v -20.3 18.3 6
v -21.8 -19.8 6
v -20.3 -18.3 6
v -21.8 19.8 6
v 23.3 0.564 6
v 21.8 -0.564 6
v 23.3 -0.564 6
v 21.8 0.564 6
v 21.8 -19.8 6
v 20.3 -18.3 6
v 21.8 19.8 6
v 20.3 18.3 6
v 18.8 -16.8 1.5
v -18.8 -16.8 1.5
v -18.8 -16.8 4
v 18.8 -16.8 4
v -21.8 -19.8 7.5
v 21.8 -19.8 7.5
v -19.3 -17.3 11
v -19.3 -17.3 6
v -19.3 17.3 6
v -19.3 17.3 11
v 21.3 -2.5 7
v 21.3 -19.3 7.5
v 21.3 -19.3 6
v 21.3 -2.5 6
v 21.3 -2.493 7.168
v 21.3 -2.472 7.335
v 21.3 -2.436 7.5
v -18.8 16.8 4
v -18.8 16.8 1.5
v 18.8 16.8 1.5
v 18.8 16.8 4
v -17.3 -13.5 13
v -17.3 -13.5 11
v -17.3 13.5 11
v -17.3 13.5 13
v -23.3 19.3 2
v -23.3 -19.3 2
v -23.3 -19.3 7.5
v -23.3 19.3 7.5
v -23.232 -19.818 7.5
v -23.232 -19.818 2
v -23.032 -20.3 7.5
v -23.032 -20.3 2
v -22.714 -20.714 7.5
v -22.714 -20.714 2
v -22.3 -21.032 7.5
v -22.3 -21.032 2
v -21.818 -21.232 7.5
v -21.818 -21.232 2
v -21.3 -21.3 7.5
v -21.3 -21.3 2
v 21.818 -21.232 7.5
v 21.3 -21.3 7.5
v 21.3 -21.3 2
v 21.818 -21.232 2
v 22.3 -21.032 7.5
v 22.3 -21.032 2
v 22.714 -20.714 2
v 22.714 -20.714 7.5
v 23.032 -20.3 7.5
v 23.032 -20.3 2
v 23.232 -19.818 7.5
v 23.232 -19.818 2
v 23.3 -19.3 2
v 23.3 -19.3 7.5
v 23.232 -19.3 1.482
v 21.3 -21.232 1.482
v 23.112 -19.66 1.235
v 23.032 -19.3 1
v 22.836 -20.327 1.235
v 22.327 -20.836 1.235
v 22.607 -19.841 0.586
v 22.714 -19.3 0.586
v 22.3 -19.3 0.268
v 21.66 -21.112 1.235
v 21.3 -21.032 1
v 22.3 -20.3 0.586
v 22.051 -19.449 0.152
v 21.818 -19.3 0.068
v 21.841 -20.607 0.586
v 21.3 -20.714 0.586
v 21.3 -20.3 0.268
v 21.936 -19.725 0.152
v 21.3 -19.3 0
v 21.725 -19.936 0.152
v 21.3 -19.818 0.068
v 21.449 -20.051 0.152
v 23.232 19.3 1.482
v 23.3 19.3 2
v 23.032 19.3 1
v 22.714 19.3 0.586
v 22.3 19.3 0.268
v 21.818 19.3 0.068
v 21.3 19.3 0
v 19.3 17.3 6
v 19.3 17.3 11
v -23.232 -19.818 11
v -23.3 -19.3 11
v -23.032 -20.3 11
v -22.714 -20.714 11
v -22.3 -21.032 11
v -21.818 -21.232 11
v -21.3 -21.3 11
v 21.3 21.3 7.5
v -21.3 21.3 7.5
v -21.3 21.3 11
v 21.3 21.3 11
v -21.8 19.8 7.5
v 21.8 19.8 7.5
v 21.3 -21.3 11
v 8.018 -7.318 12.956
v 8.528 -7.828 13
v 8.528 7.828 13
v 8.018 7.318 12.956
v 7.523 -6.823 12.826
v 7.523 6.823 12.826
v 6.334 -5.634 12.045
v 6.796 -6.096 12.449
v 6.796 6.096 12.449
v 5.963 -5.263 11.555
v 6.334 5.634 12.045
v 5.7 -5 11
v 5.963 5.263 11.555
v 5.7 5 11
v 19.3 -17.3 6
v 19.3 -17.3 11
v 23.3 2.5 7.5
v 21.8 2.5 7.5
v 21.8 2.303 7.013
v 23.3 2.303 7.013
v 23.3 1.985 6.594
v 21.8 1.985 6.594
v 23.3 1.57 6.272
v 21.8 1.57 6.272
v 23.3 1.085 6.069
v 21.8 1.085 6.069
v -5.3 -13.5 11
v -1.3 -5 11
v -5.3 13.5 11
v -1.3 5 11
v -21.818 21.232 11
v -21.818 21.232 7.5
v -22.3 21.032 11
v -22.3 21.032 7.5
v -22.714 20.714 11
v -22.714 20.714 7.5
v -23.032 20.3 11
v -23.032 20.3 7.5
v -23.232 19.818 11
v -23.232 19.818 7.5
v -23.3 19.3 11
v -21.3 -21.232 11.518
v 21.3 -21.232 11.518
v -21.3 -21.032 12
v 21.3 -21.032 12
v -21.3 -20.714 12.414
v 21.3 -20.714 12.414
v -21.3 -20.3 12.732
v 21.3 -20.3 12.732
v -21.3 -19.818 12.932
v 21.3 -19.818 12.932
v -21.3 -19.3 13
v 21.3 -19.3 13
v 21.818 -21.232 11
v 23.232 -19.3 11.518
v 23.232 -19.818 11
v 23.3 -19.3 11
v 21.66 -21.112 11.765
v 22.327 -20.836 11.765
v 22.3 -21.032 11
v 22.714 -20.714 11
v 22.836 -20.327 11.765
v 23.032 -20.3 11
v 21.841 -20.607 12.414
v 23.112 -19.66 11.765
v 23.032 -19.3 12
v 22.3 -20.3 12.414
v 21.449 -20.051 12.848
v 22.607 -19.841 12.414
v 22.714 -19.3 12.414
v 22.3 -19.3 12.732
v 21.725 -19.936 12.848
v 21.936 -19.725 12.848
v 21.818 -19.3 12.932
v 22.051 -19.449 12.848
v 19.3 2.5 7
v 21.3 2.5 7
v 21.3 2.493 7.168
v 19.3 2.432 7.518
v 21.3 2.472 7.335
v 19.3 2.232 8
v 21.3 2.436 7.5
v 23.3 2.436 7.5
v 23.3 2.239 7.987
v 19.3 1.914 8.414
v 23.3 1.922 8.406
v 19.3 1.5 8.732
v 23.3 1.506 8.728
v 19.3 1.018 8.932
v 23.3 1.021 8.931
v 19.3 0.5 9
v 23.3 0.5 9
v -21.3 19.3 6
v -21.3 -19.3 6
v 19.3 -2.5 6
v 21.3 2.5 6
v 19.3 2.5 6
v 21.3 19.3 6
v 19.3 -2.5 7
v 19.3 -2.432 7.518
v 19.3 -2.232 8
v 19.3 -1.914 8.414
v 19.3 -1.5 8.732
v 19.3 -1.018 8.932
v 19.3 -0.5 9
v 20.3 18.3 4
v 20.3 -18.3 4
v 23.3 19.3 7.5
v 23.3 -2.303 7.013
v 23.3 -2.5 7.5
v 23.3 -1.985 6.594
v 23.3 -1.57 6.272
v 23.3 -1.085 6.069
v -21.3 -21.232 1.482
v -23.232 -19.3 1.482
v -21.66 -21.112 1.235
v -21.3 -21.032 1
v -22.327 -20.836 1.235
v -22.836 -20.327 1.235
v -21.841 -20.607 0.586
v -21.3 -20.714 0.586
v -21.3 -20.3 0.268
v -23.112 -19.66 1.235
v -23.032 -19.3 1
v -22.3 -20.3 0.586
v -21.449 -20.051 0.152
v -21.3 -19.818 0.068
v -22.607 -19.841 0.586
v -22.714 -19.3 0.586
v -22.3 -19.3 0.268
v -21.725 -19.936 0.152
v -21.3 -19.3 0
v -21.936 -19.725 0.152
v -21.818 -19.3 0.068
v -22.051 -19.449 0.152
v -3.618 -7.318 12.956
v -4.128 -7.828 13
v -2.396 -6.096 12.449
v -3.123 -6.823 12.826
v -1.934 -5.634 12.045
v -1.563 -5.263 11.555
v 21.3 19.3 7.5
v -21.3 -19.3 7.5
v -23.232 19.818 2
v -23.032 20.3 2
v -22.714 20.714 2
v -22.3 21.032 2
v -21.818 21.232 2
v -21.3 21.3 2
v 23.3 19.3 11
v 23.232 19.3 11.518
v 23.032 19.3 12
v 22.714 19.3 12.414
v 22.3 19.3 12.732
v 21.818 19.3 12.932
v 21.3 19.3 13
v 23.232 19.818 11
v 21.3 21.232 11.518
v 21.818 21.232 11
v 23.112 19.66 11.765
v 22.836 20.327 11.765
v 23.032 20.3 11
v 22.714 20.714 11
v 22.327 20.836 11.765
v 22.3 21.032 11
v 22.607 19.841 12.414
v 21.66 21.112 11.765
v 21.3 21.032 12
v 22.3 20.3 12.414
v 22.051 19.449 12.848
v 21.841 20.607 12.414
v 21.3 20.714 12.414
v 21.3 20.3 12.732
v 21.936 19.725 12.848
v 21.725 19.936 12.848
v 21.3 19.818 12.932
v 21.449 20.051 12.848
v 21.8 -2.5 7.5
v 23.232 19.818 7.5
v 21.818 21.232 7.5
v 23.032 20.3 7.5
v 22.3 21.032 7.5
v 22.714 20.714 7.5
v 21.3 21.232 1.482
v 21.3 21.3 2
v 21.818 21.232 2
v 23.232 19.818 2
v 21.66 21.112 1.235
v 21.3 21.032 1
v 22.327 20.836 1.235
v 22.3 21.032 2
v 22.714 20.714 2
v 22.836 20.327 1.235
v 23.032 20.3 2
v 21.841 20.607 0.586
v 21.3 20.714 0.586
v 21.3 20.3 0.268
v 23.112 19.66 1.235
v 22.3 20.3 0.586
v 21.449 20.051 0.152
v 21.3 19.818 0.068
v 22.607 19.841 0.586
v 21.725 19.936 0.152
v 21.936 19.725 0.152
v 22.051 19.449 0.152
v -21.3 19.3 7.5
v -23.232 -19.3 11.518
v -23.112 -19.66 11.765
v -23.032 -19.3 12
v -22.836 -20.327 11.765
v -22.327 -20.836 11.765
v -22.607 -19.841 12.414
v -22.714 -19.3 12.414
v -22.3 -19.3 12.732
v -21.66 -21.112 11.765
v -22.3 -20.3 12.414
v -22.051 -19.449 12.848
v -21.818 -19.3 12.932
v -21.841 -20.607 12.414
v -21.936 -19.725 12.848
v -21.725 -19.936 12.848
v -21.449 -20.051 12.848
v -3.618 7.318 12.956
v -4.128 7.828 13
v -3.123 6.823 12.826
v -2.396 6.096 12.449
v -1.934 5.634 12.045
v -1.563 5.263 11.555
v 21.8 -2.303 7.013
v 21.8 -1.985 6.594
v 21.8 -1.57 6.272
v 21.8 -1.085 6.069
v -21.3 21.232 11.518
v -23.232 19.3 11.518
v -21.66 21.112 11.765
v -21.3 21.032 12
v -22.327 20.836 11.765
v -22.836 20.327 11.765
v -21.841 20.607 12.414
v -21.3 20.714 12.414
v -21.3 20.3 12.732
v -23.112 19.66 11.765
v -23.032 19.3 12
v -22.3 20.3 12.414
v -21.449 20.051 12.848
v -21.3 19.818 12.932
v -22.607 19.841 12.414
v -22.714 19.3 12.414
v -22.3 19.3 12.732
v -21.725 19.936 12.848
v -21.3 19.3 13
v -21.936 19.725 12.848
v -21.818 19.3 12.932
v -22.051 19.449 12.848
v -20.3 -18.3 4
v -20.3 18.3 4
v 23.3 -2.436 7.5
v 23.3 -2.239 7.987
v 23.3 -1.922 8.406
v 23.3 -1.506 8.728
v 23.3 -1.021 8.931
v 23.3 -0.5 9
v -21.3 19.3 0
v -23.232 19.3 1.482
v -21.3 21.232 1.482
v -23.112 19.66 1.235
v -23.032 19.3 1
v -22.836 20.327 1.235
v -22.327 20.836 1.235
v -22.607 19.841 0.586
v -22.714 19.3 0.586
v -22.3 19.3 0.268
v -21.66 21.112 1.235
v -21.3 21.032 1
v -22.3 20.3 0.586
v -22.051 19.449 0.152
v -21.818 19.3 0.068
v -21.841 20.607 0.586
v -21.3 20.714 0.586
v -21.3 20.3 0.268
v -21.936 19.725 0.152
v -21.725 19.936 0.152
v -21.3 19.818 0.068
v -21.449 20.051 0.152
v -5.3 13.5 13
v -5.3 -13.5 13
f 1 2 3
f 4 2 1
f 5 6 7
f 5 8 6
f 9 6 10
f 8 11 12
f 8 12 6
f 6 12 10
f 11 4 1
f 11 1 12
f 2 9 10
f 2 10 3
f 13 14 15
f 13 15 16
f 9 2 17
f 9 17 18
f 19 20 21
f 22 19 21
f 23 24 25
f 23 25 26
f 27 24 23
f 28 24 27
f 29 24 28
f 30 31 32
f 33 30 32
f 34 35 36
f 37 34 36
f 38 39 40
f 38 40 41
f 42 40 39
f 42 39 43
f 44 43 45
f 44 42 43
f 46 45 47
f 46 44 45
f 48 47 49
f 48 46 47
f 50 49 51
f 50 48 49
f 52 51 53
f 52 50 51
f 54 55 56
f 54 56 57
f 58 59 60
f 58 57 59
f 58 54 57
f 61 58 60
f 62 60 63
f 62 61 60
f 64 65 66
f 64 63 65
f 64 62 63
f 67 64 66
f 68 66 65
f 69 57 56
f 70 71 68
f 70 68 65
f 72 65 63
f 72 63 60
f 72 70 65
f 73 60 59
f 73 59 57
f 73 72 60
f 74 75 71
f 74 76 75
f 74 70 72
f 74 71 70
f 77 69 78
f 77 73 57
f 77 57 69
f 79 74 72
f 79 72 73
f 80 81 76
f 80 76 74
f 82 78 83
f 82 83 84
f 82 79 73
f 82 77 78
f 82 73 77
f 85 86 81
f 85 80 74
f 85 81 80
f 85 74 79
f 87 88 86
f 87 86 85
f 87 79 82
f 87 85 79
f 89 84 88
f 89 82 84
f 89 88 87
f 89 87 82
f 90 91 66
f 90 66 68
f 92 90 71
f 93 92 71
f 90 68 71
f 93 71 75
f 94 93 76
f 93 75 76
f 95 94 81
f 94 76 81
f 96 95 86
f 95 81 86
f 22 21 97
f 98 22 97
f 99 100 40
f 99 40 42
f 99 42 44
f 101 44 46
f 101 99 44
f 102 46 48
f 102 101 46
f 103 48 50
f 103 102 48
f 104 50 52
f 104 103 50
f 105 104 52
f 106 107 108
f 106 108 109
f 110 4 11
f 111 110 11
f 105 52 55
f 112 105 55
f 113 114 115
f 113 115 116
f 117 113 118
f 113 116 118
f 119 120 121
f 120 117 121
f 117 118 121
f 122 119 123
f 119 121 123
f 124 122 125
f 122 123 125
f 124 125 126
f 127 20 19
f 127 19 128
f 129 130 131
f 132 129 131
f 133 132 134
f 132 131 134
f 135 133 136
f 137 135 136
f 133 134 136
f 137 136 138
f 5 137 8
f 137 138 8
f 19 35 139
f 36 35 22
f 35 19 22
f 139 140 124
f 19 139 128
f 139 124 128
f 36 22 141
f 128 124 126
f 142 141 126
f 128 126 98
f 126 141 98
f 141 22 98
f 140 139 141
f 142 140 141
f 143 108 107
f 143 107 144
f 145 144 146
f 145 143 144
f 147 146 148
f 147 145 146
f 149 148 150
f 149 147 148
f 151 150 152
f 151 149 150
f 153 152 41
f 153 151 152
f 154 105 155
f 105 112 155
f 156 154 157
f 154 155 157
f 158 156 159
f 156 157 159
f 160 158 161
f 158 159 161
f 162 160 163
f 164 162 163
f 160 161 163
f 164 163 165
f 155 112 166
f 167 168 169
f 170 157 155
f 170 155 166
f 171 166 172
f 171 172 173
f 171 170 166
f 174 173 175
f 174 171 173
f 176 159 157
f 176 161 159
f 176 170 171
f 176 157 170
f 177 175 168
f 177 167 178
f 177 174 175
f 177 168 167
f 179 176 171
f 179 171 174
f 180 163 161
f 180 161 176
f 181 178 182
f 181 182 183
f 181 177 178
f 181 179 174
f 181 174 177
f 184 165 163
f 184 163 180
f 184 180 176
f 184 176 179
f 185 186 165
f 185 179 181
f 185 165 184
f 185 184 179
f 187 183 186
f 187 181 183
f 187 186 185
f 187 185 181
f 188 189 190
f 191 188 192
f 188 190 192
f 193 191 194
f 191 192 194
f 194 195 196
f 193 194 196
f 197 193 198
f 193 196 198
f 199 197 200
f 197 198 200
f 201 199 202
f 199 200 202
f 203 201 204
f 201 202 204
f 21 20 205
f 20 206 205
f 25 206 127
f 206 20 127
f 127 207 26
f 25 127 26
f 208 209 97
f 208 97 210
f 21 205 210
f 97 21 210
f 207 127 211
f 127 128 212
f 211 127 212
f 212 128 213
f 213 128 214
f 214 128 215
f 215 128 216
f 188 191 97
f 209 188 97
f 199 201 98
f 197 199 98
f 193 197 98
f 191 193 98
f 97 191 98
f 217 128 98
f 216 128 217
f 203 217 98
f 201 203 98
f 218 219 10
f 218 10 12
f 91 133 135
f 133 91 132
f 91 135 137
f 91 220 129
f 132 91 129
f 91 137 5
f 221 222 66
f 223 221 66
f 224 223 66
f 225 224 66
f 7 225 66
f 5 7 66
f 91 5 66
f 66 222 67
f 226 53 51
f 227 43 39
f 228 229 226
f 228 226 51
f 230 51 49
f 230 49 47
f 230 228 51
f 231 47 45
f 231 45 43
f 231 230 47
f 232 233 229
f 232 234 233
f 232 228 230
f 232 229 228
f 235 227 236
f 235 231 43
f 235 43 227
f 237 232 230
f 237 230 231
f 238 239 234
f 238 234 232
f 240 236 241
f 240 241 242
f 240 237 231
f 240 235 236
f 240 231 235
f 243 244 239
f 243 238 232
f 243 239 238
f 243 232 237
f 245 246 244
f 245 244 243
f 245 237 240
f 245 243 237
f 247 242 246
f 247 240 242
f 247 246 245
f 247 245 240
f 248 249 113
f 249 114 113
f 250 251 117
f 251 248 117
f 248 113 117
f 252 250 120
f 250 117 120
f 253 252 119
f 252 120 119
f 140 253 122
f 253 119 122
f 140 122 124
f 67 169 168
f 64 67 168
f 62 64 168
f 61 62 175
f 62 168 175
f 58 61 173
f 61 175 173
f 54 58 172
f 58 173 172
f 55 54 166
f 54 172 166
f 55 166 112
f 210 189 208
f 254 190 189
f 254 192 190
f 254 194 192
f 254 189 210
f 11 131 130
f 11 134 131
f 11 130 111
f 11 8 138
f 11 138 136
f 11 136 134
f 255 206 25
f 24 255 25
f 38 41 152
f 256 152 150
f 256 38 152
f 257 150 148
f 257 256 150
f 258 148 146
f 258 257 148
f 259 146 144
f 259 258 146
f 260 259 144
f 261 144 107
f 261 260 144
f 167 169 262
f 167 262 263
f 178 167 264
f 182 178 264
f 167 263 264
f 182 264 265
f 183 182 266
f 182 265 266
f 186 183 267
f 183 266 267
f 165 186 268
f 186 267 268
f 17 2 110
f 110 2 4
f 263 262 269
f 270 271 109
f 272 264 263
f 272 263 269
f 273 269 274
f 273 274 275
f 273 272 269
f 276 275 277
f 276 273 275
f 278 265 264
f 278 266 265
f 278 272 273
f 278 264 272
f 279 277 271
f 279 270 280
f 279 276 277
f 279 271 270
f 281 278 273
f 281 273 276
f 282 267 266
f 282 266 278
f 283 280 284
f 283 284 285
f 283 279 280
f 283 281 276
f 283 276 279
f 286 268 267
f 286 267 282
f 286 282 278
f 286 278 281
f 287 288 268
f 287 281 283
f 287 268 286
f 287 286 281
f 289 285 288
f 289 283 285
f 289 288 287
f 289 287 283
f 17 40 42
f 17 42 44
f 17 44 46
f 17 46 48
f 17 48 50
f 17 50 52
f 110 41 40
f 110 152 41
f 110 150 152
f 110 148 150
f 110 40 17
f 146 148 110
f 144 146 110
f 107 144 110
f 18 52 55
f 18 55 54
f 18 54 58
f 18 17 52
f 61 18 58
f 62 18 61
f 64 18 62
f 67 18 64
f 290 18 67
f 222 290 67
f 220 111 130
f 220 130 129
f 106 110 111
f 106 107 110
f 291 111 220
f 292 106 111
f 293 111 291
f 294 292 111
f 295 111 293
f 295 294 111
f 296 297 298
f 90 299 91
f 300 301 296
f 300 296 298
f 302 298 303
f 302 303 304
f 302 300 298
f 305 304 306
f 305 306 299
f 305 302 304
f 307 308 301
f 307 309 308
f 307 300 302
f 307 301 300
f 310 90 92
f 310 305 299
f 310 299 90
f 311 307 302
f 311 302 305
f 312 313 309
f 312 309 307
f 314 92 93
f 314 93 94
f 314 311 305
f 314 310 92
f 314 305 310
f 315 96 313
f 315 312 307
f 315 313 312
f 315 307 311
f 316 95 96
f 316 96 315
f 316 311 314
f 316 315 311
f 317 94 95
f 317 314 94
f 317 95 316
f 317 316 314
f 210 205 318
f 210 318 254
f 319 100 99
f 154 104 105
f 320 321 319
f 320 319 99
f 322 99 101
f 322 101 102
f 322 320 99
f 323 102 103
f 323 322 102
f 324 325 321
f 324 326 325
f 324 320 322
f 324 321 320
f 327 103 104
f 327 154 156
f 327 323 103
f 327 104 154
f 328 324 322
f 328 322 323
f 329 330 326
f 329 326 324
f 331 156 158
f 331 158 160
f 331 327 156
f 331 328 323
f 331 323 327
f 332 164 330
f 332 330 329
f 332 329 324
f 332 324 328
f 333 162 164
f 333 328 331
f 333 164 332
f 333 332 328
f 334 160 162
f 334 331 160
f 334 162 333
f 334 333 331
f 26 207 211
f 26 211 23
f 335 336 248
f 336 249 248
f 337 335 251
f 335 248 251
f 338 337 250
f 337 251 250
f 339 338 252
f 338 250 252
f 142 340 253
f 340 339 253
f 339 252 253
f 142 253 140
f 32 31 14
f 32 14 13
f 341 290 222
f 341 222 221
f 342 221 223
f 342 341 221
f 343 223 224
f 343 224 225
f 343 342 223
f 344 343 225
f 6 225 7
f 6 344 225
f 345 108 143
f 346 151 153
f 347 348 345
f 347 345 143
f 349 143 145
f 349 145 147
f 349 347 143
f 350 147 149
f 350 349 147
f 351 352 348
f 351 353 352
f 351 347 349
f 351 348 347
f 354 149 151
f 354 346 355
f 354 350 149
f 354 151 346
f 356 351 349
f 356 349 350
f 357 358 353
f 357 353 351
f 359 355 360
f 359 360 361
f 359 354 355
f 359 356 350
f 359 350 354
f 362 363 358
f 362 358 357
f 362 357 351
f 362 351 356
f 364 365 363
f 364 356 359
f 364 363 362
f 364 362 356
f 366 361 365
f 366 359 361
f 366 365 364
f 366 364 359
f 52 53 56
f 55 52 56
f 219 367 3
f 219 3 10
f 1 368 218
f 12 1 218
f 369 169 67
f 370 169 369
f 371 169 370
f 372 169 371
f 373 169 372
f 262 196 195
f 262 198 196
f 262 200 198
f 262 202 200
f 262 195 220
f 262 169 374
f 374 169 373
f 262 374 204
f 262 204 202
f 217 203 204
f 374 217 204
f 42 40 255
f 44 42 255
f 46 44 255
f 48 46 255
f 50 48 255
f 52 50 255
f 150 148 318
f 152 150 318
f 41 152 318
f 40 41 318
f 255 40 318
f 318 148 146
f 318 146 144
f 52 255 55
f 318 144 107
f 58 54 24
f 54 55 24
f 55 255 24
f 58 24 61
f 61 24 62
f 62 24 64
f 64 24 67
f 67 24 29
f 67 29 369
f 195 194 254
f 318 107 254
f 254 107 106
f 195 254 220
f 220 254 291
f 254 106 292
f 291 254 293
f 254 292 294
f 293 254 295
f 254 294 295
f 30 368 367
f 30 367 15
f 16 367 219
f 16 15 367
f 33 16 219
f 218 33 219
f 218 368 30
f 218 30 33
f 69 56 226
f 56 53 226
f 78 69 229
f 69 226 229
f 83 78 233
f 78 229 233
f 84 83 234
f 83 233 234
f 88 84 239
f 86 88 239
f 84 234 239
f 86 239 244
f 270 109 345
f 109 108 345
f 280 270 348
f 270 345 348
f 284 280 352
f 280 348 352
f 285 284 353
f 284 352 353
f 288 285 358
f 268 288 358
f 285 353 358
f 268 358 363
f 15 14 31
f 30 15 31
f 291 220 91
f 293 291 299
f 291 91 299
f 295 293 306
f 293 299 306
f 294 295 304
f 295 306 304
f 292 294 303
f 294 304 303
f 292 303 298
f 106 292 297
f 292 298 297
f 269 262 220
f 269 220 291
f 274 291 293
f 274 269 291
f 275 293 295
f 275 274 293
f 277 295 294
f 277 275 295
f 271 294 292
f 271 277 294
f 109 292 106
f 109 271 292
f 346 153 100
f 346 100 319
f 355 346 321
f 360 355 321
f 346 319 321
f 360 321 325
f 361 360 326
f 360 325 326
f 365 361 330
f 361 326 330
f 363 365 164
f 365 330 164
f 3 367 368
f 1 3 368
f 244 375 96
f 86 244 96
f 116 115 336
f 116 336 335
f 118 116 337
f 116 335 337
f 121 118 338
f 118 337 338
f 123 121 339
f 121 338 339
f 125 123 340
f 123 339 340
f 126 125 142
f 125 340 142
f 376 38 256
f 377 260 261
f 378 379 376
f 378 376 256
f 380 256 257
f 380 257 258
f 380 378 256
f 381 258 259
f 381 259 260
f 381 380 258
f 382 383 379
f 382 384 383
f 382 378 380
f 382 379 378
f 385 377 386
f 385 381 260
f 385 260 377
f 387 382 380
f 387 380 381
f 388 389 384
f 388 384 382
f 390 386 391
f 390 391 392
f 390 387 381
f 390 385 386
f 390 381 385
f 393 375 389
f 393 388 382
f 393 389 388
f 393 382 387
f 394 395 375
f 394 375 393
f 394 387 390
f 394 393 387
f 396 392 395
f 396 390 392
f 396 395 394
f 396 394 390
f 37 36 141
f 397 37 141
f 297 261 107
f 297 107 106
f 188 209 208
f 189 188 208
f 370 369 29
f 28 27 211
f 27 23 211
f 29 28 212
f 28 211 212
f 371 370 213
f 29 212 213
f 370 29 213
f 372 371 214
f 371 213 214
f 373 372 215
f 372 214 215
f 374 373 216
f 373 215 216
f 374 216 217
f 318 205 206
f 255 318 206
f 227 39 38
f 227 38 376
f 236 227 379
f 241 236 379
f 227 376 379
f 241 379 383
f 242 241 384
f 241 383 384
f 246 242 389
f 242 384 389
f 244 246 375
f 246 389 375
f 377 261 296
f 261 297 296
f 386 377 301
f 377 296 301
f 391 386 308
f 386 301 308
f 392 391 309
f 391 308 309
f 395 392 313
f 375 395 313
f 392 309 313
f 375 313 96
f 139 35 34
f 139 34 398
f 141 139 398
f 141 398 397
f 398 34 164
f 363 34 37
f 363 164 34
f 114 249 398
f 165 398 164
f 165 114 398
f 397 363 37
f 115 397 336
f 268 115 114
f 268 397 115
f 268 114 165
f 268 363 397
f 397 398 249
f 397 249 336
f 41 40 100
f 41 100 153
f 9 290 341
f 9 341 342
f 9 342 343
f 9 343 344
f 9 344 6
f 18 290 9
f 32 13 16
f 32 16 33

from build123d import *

# Parameters (mm, degrees)
F2_W          = 46.6
F2_H          = 42.6
F3_DEPTH      = 6
F5_W          = 37.6
F5_H          = 33.6
F6_DEPTH      = 4.5
F8_W          = 40.6
F8_H          = 36.6
F8_W_2        = 37.6
F8_H_2        = 33.6
F9_DEPTH      = 2
F10_W         = 46.6
F10_H         = 42.6
F10_W_2       = 43.6
F10_H_2       = 39.6
F11_DEPTH     = 1.5
F12_R         = 2
F13_W         = 1.5
F13_H         = 5
F14_DEPTH     = 1.5
F15_T1_DEPTH  = 1.5
F16_R         = 2
F18_W         = 46.6
F18_H         = 42.6
F19_DEPTH     = 7
F20_W         = 38.6
F20_H         = 34.6
F21_DEPTH     = 5
F22_W         = 46.6
F22_H         = 42.6
F22_W_2       = 42.6
F22_H_2       = 38.6
F23_DEPTH     = 1.5
F24_W         = 5
F24_H         = 5
F25_DEPTH     = 3
F26_T4_DEPTH  = 4
F26_T10_DEPTH = 4
F26_T16_DEPTH = 4
F26_T22_DEPTH = 4
F26_T28_DEPTH = 4
F26_T34_DEPTH = 4
F27_W         = 7
F27_H         = 10
F27_W_2       = 12
F27_H_2       = 27
F28_DEPTH     = 9.4
F29_R         = 2
F30_R         = 2
F31_T1_DEPTH  = 7
F31_T3_DEPTH  = 10
F31_T9_DEPTH  = 14.0710678119
F31_T14_DEPTH = 17.0710678119
F31_T21_DEPTH = 17.0710678119
F31_T25_DEPTH = 14.0710678119
F31_T32_DEPTH = 14.0710678119
F31_T36_DEPTH = 17.0710678119
F31_T43_DEPTH = 14.0710678119
F31_T48_DEPTH = 17.0710678119


# Not quite as in the source:
# - a fillet or chamfer that OpenCascade refuses, or shapes differently, is made with other operations: its cross-section is extruded or revolved along the edge and cut away or added


with BuildPart() as f3:
    # F2 (on Top) → F3 (new body)
    with BuildSketch(Plane.XY):
        Rectangle(F2_W, F2_H)
    extrude(amount=F3_DEPTH)

    # F5 (on offset) → F6 (cut)
    with BuildSketch(Plane.XY.offset(1.5)):
        Rectangle(F5_W, F5_H)
    extrude(amount=F6_DEPTH, mode=Mode.SUBTRACT)

    # F8 (on offset) → F9 (cut)
    with BuildSketch(Plane.XY.offset(4)):
        Rectangle(F8_W, F8_H)
        Rectangle(F8_W_2, F8_H_2, mode=Mode.SUBTRACT)
    extrude(amount=F9_DEPTH, mode=Mode.SUBTRACT)

    # F10 (on face) → F11 (join)
    with BuildSketch(Plane.XY.offset(6)):
        Rectangle(F10_W, F10_H)
        Rectangle(F10_W_2, F10_H_2, mode=Mode.SUBTRACT)
    extrude(amount=F11_DEPTH)

    # F12
    f12_edges = [f3.edges().sort_by_distance(p)[0] for p in [
        (-23.3, 21.3, 3.75),
        (-23.3, -21.3, 3.75),
        (23.3, 21.3, 3.75),
        (23.3, -21.3, 3.75),
    ]]
    fillet(f12_edges, radius=F12_R)

    # F13 (on face) → F14 (cut)
    with BuildSketch(Plane.XY.offset(7.5)):
        with Locations((22.55, 0)):
            Rectangle(F13_W, F13_H)
    extrude(amount=-F14_DEPTH, mode=Mode.SUBTRACT)

    # F15: fillet of radius 2 on 2 edges, made by hand

    # F15_s2 → F15_t1 (join)
    with BuildSketch(Plane.YZ.offset(21.8)):
        with BuildLine():
            ThreePointArc((-2.5, 7.5), (-1.7882531983, 6.4188611699), (-0.5635083269, 6))
            Line((-0.5635083269, 6), (-2.5, 6))
            Line((-2.5, 6), (-2.5, 7.5))
        make_face()
        with BuildLine():
            ThreePointArc((2.5, 7.5), (1.7882531983, 6.4188611699), (0.5635083269, 6))
            Line((0.5635083269, 6), (2.5, 6))
            Line((2.5, 6), (2.5, 7.5))
        make_face()
    extrude(amount=F15_T1_DEPTH)

    # F16
    f16_edges = [f3.edges().sort_by_distance(p)[0] for p in [
        (-23.3, 0, 0),
    ]]
    fillet(f16_edges, radius=F16_R)


with BuildPart() as f19:
    # F18 (on offset) → F19 (new body)
    with BuildSketch(Plane.XY.offset(6)):
        Rectangle(F18_W, F18_H)
    extrude(amount=F19_DEPTH)

    # F20 (on offset) → F21 (cut)
    with BuildSketch(Plane.XY.offset(6)):
        Rectangle(F20_W, F20_H)
    extrude(amount=F21_DEPTH, mode=Mode.SUBTRACT)

    # F22 (on face) → F23 (cut)
    with BuildSketch(Plane(origin=(0, 0, 6), x_dir=(1, 0, 0), z_dir=(0, 0, -1))):
        Rectangle(F22_W, F22_H)
        Rectangle(F22_W_2, F22_H_2, mode=Mode.SUBTRACT)
    extrude(amount=-F23_DEPTH, mode=Mode.SUBTRACT)

    # F24 (on offset) → F25 (cut)
    with BuildSketch(Plane.XY.offset(6)):
        with Locations((20.8, 0)):
            Rectangle(F24_W, F24_H)
    extrude(amount=F25_DEPTH, mode=Mode.SUBTRACT)

    # F26: fillet of radius 2 on 2 edges, made by hand


with BuildPart() as f26_tool2:
    # F26_s3 → F26_t4 (new body)
    with BuildSketch(Plane.YZ.offset(23.3)):
        with BuildLine():
            ThreePointArc((2.5, 7), (1.9142135624, 8.4142135624), (0.5, 9))
            Line((0.5, 9), (2.5, 9))
            Line((2.5, 9), (2.5, 7))
        make_face()
    extrude(amount=-F26_T4_DEPTH)

    split(bisect_by=Plane.XY.offset(7.5), keep=Keep.TOP)

    split(bisect_by=Plane.YZ.offset(21.3), keep=Keep.TOP)


with BuildPart() as f19_1:
    add(f19.part)

    # F26_t1: union F26_tool2
    add(f26_tool2.part)


with BuildPart() as f26_tool8:
    # F26_s9 → F26_t10 (new body)
    with BuildSketch(Plane.YZ.offset(23.3)):
        with BuildLine():
            ThreePointArc((2.5, 7), (1.9142135624, 8.4142135624), (0.5, 9))
            Line((0.5, 9), (2.5, 9))
            Line((2.5, 9), (2.5, 7))
        make_face()
    extrude(amount=-F26_T10_DEPTH)

    split(bisect_by=Plane.XY.offset(7.5), keep=Keep.BOTTOM)

    split(bisect_by=Plane.YZ.offset(21.3), keep=Keep.BOTTOM)


with BuildPart() as f19_2:
    add(f19_1.part)

    # F26_t7: union F26_tool8
    add(f26_tool8.part)


with BuildPart() as f26_tool14:
    # F26_s15 → F26_t16 (new body)
    with BuildSketch(Plane.YZ.offset(23.3)):
        with BuildLine():
            ThreePointArc((2.5, 7), (1.9142135624, 8.4142135624), (0.5, 9))
            Line((0.5, 9), (2.5, 9))
            Line((2.5, 9), (2.5, 7))
        make_face()
    extrude(amount=-F26_T16_DEPTH)

    split(bisect_by=Plane.XY.offset(7.5), keep=Keep.TOP)

    split(bisect_by=Plane.YZ.offset(21.3), keep=Keep.BOTTOM)


with BuildPart() as f19_3:
    add(f19_2.part)

    # F26_t13: union F26_tool14
    add(f26_tool14.part)


with BuildPart() as f26_tool20:
    # F26_s21 → F26_t22 (new body)
    with BuildSketch(Plane.YZ.offset(19.3)):
        with BuildLine():
            ThreePointArc((-2.5, 7), (-1.9142135624, 8.4142135624), (-0.5, 9))
            Line((-0.5, 9), (-2.5, 9))
            Line((-2.5, 9), (-2.5, 7))
        make_face()
    extrude(amount=F26_T22_DEPTH)

    split(bisect_by=Plane.XY.offset(7.5), keep=Keep.BOTTOM)

    split(bisect_by=Plane.YZ.offset(21.3), keep=Keep.BOTTOM)


with BuildPart() as f19_4:
    add(f19_3.part)

    # F26_t19: union F26_tool20
    add(f26_tool20.part)


with BuildPart() as f26_tool26:
    # F26_s27 → F26_t28 (new body)
    with BuildSketch(Plane.YZ.offset(19.3)):
        with BuildLine():
            ThreePointArc((-2.5, 7), (-1.9142135624, 8.4142135624), (-0.5, 9))
            Line((-0.5, 9), (-2.5, 9))
            Line((-2.5, 9), (-2.5, 7))
        make_face()
    extrude(amount=F26_T28_DEPTH)

    split(bisect_by=Plane.XY.offset(7.5), keep=Keep.TOP)

    split(bisect_by=Plane.YZ.offset(21.3), keep=Keep.BOTTOM)


with BuildPart() as f19_5:
    add(f19_4.part)

    # F26_t25: union F26_tool26
    add(f26_tool26.part)


with BuildPart() as f26_tool32:
    # F26_s33 → F26_t34 (new body)
    with BuildSketch(Plane.YZ.offset(19.3)):
        with BuildLine():
            ThreePointArc((-2.5, 7), (-1.9142135624, 8.4142135624), (-0.5, 9))
            Line((-0.5, 9), (-2.5, 9))
            Line((-2.5, 9), (-2.5, 7))
        make_face()
    extrude(amount=F26_T34_DEPTH)

    split(bisect_by=Plane.XY.offset(7.5), keep=Keep.TOP)

    split(bisect_by=Plane.YZ.offset(21.3), keep=Keep.TOP)


with BuildPart() as f19_6:
    add(f19_5.part)

    # F26_t31: union F26_tool32
    add(f26_tool32.part)

    # F27 (on offset) → F28 (cut)
    with BuildSketch(Plane.XY.offset(6)):
        with Locations((2.2, 0)):
            Rectangle(F27_W, F27_H)
        with Locations((-11.3, 0)):
            Rectangle(F27_W_2, F27_H_2)
    extrude(amount=F28_DEPTH, mode=Mode.SUBTRACT)

    # F29
    f29_edges = [f19_6.edges().sort_by_distance(p)[0] for p in [
        (-23.3, -21.3, 10.25),
        (23.3, -21.3, 10.25),
        (23.3, 21.3, 10.25),
        (-23.3, 21.3, 10.25),
    ]]
    fillet(f29_edges, radius=F29_R)

    # F30
    f30_edges = [f19_6.edges().sort_by_distance(p)[0] for p in [
        (23.3, 0, 13),
        (0, 21.3, 13),
        (-22.714214, 20.714214, 13),
        (22.714214, 20.714214, 13),
        (-23.3, 0, 13),
        (22.714214, -20.714214, 13),
        (-22.714214, -20.714214, 13),
        (0, -21.3, 13),
    ]]
    fillet(f30_edges, radius=F30_R)

    # F31: fillet of radius 3 on 4 edges, made by hand

    # F31_s2 → F31_t1 (cut)
    with BuildSketch(Plane.YZ.offset(-1.3)):
        with BuildLine():
            ThreePointArc((7.8284271247, 13), (6.0963763172, 12.4494897428), (5, 11))
            Line((5, 11), (5, 13))
            Line((5, 13), (7.8284271247, 13))
        make_face()
        with BuildLine():
            ThreePointArc((-7.8284271247, 13), (-6.0963763172, 12.4494897428), (-5, 11))
            Line((-5, 11), (-5, 13))
            Line((-5, 13), (-7.8284271247, 13))
        make_face()
    extrude(amount=F31_T1_DEPTH, mode=Mode.SUBTRACT)

    # F31_s4 → F31_t3 (cut)
    with BuildSketch(Plane.XZ.offset(-5)):
        with BuildLine():
            ThreePointArc((8.5284271247, 13), (6.7963763172, 12.4494897428), (5.7, 11))
            Line((5.7, 11), (5.7, 13))
            Line((5.7, 13), (8.5284271247, 13))
        make_face()
        with BuildLine():
            ThreePointArc((-4.1284271247, 13), (-2.3963763172, 12.4494897428), (-1.3, 11))
            Line((-1.3, 11), (-1.3, 13))
            Line((-1.3, 13), (-4.1284271247, 13))
        make_face()
    extrude(amount=F31_T3_DEPTH, mode=Mode.SUBTRACT)


with BuildPart() as f31_tool7:
    # F31_s8 → F31_t9 (new body)
    with BuildSketch(Plane.YZ.offset(-8.3710678119)):
        with BuildLine():
            ThreePointArc((7.8284271247, 13), (6.0963763172, 12.4494897428), (5, 11))
            Line((5, 11), (5, 13))
            Line((5, 13), (7.8284271247, 13))
        make_face()
    extrude(amount=F31_T9_DEPTH)

    split(bisect_by=Plane.YZ.offset(-5.3), keep=Keep.TOP)

    split(bisect_by=Plane.YZ.offset(-1.3), keep=Keep.BOTTOM)


with BuildPart() as f31_tool12:
    # F31_s13 → F31_t14 (new body)
    with BuildSketch(Plane.XZ.offset(5)):
        with BuildLine():
            ThreePointArc((-4.1284271247, 13), (-2.3963763172, 12.4494897428), (-1.3, 11))
            Line((-1.3, 11), (-1.3, 13))
            Line((-1.3, 13), (-4.1284271247, 13))
        make_face()
    extrude(amount=-F31_T14_DEPTH)

    split(bisect_by=Plane.XZ.offset(-5), keep=Keep.BOTTOM)


with BuildPart() as f31_tool7_1:
    add(f31_tool7.part)

    # F31_t16: intersect F31_tool12
    add(f31_tool12.part, mode=Mode.INTERSECT)


with BuildPart() as f19_7:
    add(f19_6.part)

    # F31_t5: cut F31_tool7
    add(f31_tool7_1.part, mode=Mode.SUBTRACT)


with BuildPart() as f31_tool19:
    # F31_s20 → F31_t21 (new body)
    with BuildSketch(Plane.XZ.offset(-12.0710678119)):
        with BuildLine():
            ThreePointArc((8.5284271247, 13), (6.7963763172, 12.4494897428), (5.7, 11))
            Line((5.7, 11), (5.7, 13))
            Line((5.7, 13), (8.5284271247, 13))
        make_face()
    extrude(amount=F31_T21_DEPTH)

    split(bisect_by=Plane.XZ.offset(-5), keep=Keep.BOTTOM)


with BuildPart() as f31_tool23:
    # F31_s24 → F31_t25 (new body)
    with BuildSketch(Plane.YZ.offset(-1.3)):
        with BuildLine():
            ThreePointArc((7.8284271247, 13), (6.0963763172, 12.4494897428), (5, 11))
            Line((5, 11), (5, 13))
            Line((5, 13), (7.8284271247, 13))
        make_face()
    extrude(amount=F31_T25_DEPTH)

    split(bisect_by=Plane.YZ.offset(5.7), keep=Keep.TOP)


with BuildPart() as f31_tool19_1:
    add(f31_tool19.part)

    # F31_t27: intersect F31_tool23
    add(f31_tool23.part, mode=Mode.INTERSECT)


with BuildPart() as f19_8:
    add(f19_7.part)

    # F31_t17: cut F31_tool19
    add(f31_tool19_1.part, mode=Mode.SUBTRACT)


with BuildPart() as f31_tool30:
    # F31_s31 → F31_t32 (new body)
    with BuildSketch(Plane.YZ.offset(12.7710678119)):
        with BuildLine():
            ThreePointArc((-7.8284271247, 13), (-6.0963763172, 12.4494897428), (-5, 11))
            Line((-5, 11), (-5, 13))
            Line((-5, 13), (-7.8284271247, 13))
        make_face()
    extrude(amount=-F31_T32_DEPTH)

    split(bisect_by=Plane.YZ.offset(5.7), keep=Keep.TOP)


with BuildPart() as f31_tool34:
    # F31_s35 → F31_t36 (new body)
    with BuildSketch(Plane.XZ.offset(-5)):
        with BuildLine():
            ThreePointArc((8.5284271247, 13), (6.7963763172, 12.4494897428), (5.7, 11))
            Line((5.7, 11), (5.7, 13))
            Line((5.7, 13), (8.5284271247, 13))
        make_face()
    extrude(amount=F31_T36_DEPTH)

    split(bisect_by=Plane.XZ.offset(5), keep=Keep.TOP)


with BuildPart() as f31_tool30_1:
    add(f31_tool30.part)

    # F31_t38: intersect F31_tool34
    add(f31_tool34.part, mode=Mode.INTERSECT)


with BuildPart() as f19_9:
    add(f19_8.part)

    # F31_t28: cut F31_tool30
    add(f31_tool30_1.part, mode=Mode.SUBTRACT)


with BuildPart() as f31_tool41:
    # F31_s42 → F31_t43 (new body)
    with BuildSketch(Plane.YZ.offset(5.7)):
        with BuildLine():
            ThreePointArc((-7.8284271247, 13), (-6.0963763172, 12.4494897428), (-5, 11))
            Line((-5, 11), (-5, 13))
            Line((-5, 13), (-7.8284271247, 13))
        make_face()
    extrude(amount=-F31_T43_DEPTH)

    split(bisect_by=Plane.YZ.offset(-5.3), keep=Keep.TOP)

    split(bisect_by=Plane.YZ.offset(-1.3), keep=Keep.BOTTOM)


with BuildPart() as f31_tool46:
    # F31_s47 → F31_t48 (new body)
    with BuildSketch(Plane.XZ.offset(12.0710678119)):
        with BuildLine():
            ThreePointArc((-4.1284271247, 13), (-2.3963763172, 12.4494897428), (-1.3, 11))
            Line((-1.3, 11), (-1.3, 13))
            Line((-1.3, 13), (-4.1284271247, 13))
        make_face()
    extrude(amount=-F31_T48_DEPTH)

    split(bisect_by=Plane.XZ.offset(5), keep=Keep.TOP)


with BuildPart() as f31_tool41_1:
    add(f31_tool41.part)

    # F31_t50: intersect F31_tool46
    add(f31_tool46.part, mode=Mode.INTERSECT)


with BuildPart() as f19_10:
    add(f19_9.part)

    # F31_t39: cut F31_tool41
    add(f31_tool41_1.part, mode=Mode.SUBTRACT)


solid = Compound([f3.part, f19_10.part])
